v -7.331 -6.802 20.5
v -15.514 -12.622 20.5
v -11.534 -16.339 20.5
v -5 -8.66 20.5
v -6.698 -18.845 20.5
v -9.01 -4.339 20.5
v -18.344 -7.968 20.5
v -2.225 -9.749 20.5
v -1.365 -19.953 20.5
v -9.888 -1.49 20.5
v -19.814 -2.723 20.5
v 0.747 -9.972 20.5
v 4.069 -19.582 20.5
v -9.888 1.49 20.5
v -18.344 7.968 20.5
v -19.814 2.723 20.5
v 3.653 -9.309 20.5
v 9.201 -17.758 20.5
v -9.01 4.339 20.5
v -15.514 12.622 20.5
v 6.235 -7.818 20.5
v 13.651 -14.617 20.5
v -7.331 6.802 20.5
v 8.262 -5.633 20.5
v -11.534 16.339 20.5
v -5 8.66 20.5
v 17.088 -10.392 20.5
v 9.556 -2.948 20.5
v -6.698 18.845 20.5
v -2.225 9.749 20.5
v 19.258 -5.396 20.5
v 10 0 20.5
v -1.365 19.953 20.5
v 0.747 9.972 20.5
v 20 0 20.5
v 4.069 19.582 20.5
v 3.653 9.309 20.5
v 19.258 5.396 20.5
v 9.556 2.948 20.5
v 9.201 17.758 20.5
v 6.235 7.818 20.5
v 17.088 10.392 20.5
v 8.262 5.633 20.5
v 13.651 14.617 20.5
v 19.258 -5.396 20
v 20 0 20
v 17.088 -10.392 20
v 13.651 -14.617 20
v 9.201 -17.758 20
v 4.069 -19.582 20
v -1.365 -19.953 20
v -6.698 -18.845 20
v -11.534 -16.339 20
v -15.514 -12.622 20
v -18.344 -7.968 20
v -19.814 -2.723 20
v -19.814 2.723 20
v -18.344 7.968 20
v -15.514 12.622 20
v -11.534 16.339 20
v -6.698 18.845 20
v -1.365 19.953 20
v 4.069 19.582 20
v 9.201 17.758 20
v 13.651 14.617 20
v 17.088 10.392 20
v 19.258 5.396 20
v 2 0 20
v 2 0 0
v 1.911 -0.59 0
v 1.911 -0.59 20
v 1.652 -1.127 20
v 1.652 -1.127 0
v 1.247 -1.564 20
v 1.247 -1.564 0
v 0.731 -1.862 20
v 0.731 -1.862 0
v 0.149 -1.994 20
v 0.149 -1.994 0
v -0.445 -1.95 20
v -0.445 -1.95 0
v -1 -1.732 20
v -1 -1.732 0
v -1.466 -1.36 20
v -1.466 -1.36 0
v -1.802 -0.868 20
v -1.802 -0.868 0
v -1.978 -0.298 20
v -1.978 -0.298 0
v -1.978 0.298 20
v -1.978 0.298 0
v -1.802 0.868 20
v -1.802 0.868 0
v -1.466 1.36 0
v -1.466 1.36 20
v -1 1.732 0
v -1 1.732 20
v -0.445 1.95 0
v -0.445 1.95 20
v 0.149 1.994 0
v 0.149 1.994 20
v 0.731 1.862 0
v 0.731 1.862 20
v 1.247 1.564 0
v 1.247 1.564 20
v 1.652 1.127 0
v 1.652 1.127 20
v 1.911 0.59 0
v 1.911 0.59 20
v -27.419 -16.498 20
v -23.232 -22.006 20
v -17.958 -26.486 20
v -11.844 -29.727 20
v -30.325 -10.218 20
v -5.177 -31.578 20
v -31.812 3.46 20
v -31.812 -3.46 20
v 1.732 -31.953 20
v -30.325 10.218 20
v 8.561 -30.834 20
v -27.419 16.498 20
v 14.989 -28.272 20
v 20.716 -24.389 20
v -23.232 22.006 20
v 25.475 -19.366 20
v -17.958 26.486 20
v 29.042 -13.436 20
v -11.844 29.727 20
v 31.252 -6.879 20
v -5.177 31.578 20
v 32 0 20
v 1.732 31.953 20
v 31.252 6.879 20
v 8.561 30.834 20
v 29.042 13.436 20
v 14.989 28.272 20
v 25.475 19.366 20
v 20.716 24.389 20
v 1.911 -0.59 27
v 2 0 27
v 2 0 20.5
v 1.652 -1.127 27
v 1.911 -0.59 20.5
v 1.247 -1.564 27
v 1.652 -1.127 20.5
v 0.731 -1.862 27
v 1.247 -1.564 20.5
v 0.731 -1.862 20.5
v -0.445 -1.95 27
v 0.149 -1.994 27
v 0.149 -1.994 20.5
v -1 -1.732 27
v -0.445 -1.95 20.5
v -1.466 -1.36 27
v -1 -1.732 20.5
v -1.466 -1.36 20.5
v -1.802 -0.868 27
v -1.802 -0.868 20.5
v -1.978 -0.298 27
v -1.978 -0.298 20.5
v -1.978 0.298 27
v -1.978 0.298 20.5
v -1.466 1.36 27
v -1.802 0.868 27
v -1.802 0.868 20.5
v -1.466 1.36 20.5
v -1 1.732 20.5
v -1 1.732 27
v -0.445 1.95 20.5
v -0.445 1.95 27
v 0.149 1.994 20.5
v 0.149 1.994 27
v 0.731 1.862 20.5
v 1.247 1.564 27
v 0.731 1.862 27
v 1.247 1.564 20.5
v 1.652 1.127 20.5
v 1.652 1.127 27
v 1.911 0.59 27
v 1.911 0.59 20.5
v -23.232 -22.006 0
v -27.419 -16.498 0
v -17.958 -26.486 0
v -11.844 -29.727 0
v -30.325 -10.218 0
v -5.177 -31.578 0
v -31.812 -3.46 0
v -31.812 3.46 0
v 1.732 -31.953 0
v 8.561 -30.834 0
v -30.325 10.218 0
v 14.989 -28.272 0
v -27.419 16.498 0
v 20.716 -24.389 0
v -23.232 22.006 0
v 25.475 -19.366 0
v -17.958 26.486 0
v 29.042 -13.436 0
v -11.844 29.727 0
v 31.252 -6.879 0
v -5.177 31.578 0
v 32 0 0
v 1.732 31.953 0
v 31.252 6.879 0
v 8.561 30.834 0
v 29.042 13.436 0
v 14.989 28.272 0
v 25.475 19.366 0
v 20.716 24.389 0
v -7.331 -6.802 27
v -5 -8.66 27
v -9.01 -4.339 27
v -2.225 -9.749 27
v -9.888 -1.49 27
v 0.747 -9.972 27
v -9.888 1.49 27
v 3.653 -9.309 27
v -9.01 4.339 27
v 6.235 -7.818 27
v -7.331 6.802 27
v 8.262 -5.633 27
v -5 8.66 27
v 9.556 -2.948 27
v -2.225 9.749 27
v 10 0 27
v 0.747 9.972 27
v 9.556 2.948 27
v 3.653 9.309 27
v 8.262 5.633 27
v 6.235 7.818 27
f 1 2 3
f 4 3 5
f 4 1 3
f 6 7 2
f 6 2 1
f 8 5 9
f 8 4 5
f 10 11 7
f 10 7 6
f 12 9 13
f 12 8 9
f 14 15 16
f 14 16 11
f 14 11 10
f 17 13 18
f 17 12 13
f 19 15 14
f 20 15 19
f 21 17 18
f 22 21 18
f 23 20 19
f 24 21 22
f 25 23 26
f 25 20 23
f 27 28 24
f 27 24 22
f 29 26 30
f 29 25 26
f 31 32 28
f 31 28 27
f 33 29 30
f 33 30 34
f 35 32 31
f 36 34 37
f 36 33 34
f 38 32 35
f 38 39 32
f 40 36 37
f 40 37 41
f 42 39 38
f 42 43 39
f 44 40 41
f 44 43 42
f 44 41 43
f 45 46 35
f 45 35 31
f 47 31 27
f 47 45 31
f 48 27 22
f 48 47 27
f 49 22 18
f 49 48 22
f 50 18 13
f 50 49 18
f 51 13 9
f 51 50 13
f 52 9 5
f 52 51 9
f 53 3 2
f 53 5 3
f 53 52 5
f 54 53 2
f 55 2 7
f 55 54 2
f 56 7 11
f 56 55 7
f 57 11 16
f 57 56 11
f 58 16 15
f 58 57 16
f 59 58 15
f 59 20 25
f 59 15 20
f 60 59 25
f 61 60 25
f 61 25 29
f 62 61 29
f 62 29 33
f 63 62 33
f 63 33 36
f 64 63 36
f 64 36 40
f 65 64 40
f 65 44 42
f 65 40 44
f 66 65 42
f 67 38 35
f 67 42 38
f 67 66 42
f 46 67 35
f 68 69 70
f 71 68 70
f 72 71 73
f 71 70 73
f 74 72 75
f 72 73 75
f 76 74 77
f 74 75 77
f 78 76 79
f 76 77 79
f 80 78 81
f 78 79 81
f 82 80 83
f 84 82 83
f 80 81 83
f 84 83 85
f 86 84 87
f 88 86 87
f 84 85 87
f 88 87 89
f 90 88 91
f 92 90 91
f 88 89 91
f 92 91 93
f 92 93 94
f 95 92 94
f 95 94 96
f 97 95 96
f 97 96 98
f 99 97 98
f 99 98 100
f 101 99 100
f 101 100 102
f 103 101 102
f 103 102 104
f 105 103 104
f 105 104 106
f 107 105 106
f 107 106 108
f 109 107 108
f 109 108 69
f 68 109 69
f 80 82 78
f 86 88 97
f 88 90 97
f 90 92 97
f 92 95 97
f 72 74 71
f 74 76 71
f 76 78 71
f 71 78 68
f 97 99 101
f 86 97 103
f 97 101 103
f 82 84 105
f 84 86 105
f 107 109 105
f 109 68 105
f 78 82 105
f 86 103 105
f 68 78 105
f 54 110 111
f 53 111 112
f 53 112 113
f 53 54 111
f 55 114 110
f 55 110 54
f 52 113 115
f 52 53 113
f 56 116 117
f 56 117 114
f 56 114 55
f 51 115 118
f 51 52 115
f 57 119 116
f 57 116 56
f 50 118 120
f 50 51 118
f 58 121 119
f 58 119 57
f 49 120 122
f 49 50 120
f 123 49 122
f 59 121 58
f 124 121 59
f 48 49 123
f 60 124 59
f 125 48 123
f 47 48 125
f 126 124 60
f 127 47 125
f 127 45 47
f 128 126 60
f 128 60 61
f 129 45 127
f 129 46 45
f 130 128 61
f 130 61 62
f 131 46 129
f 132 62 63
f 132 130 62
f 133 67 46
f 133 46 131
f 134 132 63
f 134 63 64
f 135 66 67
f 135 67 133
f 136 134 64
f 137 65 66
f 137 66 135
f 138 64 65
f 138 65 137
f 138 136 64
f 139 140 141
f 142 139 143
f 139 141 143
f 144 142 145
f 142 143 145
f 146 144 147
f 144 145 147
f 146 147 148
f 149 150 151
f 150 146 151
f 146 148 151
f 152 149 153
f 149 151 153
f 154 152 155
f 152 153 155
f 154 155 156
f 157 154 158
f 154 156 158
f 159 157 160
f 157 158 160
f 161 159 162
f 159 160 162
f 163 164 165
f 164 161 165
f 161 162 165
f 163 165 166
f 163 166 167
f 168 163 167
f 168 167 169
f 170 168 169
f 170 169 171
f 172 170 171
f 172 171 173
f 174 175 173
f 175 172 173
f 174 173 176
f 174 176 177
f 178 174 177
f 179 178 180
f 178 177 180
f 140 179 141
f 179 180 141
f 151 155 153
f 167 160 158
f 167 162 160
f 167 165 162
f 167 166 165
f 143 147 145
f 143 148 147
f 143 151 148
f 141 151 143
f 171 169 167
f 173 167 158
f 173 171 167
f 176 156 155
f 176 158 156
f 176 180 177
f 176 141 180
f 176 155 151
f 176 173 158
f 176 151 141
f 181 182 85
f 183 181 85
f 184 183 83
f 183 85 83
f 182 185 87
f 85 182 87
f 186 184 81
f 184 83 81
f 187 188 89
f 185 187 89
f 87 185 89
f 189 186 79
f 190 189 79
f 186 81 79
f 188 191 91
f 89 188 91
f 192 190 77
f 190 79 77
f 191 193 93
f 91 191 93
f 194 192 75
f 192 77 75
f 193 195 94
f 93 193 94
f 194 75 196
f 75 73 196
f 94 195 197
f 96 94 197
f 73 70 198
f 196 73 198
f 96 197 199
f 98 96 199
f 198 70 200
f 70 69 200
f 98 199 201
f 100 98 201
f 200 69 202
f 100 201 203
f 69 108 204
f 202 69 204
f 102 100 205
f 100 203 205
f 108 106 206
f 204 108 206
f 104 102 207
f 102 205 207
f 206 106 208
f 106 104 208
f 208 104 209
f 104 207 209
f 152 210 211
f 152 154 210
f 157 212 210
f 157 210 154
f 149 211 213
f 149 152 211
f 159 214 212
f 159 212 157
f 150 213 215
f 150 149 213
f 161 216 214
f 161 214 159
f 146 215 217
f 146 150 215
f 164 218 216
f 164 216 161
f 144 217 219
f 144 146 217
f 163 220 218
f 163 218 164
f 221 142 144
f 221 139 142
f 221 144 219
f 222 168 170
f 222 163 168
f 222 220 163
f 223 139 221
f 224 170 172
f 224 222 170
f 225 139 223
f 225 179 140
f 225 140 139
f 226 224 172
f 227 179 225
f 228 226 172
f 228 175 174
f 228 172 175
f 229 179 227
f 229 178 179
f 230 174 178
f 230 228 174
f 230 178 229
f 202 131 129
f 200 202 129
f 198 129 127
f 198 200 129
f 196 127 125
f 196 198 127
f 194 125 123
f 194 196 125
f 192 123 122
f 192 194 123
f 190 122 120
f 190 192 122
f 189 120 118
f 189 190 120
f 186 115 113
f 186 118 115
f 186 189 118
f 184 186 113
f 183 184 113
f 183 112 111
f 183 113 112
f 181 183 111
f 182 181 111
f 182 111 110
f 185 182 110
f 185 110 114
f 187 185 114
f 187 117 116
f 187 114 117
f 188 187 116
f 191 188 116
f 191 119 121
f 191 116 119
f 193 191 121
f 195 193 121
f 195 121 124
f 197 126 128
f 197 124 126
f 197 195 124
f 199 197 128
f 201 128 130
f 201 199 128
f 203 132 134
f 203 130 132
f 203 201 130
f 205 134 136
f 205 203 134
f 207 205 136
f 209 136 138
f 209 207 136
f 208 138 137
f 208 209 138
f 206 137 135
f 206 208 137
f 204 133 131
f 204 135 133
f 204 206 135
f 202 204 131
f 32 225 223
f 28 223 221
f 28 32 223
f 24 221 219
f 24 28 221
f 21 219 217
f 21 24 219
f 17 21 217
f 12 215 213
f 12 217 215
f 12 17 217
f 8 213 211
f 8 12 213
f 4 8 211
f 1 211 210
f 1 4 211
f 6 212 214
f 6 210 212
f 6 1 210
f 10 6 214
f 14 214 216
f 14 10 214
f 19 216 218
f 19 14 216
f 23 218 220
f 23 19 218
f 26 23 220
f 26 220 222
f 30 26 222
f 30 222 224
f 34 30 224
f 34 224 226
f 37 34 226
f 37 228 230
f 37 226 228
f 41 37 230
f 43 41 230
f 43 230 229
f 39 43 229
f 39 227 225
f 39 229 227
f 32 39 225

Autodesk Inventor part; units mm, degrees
ref_plane "YZ Plane" through (0, 0, 0) normal (1, 0, 0) x (0, 1, 0)
ref_plane "XZ Plane" through (0, 0, 0) normal (0, 1, 0) x (-1, 0, 0)
ref_plane "XY Plane" through (0, 0, 0) normal (0, 0, 1) x (1, 0, 0)
sketch "Sketch1" plane through (0, 0, 0) normal (0, 0, 1) x (1, 0, 0)
  circle A0 centre (0, 0) radius 32
  circle A1 centre (0, 0) radius 2
  dimension "d0" = 64
  dimension "d1" = 4
extrude "Extrusion1" add sketch "Sketch1" along normal blind 20
sketch "Sketch2" plane through (0, 0, 20) normal (0, 0, 1) x (1, 0, 0)
  circle A0 centre (0, 0) radius 2 projected
  circle A1 centre (0, 0) radius 10
  dimension "d4" = 20
extrude "Extrusion2" add sketch "Sketch2" along normal blind 7
sketch "Sketch3" plane through (0, 0, 20) normal (0, 0, 1) x (1, 0, 0)
  circle A0 centre (0, 0) radius 20
  dimension "d7" = 40
extrude "Extrusion3" add sketch "Sketch3" along normal blind 0.5
properties part number "weel" material "Rubber"
